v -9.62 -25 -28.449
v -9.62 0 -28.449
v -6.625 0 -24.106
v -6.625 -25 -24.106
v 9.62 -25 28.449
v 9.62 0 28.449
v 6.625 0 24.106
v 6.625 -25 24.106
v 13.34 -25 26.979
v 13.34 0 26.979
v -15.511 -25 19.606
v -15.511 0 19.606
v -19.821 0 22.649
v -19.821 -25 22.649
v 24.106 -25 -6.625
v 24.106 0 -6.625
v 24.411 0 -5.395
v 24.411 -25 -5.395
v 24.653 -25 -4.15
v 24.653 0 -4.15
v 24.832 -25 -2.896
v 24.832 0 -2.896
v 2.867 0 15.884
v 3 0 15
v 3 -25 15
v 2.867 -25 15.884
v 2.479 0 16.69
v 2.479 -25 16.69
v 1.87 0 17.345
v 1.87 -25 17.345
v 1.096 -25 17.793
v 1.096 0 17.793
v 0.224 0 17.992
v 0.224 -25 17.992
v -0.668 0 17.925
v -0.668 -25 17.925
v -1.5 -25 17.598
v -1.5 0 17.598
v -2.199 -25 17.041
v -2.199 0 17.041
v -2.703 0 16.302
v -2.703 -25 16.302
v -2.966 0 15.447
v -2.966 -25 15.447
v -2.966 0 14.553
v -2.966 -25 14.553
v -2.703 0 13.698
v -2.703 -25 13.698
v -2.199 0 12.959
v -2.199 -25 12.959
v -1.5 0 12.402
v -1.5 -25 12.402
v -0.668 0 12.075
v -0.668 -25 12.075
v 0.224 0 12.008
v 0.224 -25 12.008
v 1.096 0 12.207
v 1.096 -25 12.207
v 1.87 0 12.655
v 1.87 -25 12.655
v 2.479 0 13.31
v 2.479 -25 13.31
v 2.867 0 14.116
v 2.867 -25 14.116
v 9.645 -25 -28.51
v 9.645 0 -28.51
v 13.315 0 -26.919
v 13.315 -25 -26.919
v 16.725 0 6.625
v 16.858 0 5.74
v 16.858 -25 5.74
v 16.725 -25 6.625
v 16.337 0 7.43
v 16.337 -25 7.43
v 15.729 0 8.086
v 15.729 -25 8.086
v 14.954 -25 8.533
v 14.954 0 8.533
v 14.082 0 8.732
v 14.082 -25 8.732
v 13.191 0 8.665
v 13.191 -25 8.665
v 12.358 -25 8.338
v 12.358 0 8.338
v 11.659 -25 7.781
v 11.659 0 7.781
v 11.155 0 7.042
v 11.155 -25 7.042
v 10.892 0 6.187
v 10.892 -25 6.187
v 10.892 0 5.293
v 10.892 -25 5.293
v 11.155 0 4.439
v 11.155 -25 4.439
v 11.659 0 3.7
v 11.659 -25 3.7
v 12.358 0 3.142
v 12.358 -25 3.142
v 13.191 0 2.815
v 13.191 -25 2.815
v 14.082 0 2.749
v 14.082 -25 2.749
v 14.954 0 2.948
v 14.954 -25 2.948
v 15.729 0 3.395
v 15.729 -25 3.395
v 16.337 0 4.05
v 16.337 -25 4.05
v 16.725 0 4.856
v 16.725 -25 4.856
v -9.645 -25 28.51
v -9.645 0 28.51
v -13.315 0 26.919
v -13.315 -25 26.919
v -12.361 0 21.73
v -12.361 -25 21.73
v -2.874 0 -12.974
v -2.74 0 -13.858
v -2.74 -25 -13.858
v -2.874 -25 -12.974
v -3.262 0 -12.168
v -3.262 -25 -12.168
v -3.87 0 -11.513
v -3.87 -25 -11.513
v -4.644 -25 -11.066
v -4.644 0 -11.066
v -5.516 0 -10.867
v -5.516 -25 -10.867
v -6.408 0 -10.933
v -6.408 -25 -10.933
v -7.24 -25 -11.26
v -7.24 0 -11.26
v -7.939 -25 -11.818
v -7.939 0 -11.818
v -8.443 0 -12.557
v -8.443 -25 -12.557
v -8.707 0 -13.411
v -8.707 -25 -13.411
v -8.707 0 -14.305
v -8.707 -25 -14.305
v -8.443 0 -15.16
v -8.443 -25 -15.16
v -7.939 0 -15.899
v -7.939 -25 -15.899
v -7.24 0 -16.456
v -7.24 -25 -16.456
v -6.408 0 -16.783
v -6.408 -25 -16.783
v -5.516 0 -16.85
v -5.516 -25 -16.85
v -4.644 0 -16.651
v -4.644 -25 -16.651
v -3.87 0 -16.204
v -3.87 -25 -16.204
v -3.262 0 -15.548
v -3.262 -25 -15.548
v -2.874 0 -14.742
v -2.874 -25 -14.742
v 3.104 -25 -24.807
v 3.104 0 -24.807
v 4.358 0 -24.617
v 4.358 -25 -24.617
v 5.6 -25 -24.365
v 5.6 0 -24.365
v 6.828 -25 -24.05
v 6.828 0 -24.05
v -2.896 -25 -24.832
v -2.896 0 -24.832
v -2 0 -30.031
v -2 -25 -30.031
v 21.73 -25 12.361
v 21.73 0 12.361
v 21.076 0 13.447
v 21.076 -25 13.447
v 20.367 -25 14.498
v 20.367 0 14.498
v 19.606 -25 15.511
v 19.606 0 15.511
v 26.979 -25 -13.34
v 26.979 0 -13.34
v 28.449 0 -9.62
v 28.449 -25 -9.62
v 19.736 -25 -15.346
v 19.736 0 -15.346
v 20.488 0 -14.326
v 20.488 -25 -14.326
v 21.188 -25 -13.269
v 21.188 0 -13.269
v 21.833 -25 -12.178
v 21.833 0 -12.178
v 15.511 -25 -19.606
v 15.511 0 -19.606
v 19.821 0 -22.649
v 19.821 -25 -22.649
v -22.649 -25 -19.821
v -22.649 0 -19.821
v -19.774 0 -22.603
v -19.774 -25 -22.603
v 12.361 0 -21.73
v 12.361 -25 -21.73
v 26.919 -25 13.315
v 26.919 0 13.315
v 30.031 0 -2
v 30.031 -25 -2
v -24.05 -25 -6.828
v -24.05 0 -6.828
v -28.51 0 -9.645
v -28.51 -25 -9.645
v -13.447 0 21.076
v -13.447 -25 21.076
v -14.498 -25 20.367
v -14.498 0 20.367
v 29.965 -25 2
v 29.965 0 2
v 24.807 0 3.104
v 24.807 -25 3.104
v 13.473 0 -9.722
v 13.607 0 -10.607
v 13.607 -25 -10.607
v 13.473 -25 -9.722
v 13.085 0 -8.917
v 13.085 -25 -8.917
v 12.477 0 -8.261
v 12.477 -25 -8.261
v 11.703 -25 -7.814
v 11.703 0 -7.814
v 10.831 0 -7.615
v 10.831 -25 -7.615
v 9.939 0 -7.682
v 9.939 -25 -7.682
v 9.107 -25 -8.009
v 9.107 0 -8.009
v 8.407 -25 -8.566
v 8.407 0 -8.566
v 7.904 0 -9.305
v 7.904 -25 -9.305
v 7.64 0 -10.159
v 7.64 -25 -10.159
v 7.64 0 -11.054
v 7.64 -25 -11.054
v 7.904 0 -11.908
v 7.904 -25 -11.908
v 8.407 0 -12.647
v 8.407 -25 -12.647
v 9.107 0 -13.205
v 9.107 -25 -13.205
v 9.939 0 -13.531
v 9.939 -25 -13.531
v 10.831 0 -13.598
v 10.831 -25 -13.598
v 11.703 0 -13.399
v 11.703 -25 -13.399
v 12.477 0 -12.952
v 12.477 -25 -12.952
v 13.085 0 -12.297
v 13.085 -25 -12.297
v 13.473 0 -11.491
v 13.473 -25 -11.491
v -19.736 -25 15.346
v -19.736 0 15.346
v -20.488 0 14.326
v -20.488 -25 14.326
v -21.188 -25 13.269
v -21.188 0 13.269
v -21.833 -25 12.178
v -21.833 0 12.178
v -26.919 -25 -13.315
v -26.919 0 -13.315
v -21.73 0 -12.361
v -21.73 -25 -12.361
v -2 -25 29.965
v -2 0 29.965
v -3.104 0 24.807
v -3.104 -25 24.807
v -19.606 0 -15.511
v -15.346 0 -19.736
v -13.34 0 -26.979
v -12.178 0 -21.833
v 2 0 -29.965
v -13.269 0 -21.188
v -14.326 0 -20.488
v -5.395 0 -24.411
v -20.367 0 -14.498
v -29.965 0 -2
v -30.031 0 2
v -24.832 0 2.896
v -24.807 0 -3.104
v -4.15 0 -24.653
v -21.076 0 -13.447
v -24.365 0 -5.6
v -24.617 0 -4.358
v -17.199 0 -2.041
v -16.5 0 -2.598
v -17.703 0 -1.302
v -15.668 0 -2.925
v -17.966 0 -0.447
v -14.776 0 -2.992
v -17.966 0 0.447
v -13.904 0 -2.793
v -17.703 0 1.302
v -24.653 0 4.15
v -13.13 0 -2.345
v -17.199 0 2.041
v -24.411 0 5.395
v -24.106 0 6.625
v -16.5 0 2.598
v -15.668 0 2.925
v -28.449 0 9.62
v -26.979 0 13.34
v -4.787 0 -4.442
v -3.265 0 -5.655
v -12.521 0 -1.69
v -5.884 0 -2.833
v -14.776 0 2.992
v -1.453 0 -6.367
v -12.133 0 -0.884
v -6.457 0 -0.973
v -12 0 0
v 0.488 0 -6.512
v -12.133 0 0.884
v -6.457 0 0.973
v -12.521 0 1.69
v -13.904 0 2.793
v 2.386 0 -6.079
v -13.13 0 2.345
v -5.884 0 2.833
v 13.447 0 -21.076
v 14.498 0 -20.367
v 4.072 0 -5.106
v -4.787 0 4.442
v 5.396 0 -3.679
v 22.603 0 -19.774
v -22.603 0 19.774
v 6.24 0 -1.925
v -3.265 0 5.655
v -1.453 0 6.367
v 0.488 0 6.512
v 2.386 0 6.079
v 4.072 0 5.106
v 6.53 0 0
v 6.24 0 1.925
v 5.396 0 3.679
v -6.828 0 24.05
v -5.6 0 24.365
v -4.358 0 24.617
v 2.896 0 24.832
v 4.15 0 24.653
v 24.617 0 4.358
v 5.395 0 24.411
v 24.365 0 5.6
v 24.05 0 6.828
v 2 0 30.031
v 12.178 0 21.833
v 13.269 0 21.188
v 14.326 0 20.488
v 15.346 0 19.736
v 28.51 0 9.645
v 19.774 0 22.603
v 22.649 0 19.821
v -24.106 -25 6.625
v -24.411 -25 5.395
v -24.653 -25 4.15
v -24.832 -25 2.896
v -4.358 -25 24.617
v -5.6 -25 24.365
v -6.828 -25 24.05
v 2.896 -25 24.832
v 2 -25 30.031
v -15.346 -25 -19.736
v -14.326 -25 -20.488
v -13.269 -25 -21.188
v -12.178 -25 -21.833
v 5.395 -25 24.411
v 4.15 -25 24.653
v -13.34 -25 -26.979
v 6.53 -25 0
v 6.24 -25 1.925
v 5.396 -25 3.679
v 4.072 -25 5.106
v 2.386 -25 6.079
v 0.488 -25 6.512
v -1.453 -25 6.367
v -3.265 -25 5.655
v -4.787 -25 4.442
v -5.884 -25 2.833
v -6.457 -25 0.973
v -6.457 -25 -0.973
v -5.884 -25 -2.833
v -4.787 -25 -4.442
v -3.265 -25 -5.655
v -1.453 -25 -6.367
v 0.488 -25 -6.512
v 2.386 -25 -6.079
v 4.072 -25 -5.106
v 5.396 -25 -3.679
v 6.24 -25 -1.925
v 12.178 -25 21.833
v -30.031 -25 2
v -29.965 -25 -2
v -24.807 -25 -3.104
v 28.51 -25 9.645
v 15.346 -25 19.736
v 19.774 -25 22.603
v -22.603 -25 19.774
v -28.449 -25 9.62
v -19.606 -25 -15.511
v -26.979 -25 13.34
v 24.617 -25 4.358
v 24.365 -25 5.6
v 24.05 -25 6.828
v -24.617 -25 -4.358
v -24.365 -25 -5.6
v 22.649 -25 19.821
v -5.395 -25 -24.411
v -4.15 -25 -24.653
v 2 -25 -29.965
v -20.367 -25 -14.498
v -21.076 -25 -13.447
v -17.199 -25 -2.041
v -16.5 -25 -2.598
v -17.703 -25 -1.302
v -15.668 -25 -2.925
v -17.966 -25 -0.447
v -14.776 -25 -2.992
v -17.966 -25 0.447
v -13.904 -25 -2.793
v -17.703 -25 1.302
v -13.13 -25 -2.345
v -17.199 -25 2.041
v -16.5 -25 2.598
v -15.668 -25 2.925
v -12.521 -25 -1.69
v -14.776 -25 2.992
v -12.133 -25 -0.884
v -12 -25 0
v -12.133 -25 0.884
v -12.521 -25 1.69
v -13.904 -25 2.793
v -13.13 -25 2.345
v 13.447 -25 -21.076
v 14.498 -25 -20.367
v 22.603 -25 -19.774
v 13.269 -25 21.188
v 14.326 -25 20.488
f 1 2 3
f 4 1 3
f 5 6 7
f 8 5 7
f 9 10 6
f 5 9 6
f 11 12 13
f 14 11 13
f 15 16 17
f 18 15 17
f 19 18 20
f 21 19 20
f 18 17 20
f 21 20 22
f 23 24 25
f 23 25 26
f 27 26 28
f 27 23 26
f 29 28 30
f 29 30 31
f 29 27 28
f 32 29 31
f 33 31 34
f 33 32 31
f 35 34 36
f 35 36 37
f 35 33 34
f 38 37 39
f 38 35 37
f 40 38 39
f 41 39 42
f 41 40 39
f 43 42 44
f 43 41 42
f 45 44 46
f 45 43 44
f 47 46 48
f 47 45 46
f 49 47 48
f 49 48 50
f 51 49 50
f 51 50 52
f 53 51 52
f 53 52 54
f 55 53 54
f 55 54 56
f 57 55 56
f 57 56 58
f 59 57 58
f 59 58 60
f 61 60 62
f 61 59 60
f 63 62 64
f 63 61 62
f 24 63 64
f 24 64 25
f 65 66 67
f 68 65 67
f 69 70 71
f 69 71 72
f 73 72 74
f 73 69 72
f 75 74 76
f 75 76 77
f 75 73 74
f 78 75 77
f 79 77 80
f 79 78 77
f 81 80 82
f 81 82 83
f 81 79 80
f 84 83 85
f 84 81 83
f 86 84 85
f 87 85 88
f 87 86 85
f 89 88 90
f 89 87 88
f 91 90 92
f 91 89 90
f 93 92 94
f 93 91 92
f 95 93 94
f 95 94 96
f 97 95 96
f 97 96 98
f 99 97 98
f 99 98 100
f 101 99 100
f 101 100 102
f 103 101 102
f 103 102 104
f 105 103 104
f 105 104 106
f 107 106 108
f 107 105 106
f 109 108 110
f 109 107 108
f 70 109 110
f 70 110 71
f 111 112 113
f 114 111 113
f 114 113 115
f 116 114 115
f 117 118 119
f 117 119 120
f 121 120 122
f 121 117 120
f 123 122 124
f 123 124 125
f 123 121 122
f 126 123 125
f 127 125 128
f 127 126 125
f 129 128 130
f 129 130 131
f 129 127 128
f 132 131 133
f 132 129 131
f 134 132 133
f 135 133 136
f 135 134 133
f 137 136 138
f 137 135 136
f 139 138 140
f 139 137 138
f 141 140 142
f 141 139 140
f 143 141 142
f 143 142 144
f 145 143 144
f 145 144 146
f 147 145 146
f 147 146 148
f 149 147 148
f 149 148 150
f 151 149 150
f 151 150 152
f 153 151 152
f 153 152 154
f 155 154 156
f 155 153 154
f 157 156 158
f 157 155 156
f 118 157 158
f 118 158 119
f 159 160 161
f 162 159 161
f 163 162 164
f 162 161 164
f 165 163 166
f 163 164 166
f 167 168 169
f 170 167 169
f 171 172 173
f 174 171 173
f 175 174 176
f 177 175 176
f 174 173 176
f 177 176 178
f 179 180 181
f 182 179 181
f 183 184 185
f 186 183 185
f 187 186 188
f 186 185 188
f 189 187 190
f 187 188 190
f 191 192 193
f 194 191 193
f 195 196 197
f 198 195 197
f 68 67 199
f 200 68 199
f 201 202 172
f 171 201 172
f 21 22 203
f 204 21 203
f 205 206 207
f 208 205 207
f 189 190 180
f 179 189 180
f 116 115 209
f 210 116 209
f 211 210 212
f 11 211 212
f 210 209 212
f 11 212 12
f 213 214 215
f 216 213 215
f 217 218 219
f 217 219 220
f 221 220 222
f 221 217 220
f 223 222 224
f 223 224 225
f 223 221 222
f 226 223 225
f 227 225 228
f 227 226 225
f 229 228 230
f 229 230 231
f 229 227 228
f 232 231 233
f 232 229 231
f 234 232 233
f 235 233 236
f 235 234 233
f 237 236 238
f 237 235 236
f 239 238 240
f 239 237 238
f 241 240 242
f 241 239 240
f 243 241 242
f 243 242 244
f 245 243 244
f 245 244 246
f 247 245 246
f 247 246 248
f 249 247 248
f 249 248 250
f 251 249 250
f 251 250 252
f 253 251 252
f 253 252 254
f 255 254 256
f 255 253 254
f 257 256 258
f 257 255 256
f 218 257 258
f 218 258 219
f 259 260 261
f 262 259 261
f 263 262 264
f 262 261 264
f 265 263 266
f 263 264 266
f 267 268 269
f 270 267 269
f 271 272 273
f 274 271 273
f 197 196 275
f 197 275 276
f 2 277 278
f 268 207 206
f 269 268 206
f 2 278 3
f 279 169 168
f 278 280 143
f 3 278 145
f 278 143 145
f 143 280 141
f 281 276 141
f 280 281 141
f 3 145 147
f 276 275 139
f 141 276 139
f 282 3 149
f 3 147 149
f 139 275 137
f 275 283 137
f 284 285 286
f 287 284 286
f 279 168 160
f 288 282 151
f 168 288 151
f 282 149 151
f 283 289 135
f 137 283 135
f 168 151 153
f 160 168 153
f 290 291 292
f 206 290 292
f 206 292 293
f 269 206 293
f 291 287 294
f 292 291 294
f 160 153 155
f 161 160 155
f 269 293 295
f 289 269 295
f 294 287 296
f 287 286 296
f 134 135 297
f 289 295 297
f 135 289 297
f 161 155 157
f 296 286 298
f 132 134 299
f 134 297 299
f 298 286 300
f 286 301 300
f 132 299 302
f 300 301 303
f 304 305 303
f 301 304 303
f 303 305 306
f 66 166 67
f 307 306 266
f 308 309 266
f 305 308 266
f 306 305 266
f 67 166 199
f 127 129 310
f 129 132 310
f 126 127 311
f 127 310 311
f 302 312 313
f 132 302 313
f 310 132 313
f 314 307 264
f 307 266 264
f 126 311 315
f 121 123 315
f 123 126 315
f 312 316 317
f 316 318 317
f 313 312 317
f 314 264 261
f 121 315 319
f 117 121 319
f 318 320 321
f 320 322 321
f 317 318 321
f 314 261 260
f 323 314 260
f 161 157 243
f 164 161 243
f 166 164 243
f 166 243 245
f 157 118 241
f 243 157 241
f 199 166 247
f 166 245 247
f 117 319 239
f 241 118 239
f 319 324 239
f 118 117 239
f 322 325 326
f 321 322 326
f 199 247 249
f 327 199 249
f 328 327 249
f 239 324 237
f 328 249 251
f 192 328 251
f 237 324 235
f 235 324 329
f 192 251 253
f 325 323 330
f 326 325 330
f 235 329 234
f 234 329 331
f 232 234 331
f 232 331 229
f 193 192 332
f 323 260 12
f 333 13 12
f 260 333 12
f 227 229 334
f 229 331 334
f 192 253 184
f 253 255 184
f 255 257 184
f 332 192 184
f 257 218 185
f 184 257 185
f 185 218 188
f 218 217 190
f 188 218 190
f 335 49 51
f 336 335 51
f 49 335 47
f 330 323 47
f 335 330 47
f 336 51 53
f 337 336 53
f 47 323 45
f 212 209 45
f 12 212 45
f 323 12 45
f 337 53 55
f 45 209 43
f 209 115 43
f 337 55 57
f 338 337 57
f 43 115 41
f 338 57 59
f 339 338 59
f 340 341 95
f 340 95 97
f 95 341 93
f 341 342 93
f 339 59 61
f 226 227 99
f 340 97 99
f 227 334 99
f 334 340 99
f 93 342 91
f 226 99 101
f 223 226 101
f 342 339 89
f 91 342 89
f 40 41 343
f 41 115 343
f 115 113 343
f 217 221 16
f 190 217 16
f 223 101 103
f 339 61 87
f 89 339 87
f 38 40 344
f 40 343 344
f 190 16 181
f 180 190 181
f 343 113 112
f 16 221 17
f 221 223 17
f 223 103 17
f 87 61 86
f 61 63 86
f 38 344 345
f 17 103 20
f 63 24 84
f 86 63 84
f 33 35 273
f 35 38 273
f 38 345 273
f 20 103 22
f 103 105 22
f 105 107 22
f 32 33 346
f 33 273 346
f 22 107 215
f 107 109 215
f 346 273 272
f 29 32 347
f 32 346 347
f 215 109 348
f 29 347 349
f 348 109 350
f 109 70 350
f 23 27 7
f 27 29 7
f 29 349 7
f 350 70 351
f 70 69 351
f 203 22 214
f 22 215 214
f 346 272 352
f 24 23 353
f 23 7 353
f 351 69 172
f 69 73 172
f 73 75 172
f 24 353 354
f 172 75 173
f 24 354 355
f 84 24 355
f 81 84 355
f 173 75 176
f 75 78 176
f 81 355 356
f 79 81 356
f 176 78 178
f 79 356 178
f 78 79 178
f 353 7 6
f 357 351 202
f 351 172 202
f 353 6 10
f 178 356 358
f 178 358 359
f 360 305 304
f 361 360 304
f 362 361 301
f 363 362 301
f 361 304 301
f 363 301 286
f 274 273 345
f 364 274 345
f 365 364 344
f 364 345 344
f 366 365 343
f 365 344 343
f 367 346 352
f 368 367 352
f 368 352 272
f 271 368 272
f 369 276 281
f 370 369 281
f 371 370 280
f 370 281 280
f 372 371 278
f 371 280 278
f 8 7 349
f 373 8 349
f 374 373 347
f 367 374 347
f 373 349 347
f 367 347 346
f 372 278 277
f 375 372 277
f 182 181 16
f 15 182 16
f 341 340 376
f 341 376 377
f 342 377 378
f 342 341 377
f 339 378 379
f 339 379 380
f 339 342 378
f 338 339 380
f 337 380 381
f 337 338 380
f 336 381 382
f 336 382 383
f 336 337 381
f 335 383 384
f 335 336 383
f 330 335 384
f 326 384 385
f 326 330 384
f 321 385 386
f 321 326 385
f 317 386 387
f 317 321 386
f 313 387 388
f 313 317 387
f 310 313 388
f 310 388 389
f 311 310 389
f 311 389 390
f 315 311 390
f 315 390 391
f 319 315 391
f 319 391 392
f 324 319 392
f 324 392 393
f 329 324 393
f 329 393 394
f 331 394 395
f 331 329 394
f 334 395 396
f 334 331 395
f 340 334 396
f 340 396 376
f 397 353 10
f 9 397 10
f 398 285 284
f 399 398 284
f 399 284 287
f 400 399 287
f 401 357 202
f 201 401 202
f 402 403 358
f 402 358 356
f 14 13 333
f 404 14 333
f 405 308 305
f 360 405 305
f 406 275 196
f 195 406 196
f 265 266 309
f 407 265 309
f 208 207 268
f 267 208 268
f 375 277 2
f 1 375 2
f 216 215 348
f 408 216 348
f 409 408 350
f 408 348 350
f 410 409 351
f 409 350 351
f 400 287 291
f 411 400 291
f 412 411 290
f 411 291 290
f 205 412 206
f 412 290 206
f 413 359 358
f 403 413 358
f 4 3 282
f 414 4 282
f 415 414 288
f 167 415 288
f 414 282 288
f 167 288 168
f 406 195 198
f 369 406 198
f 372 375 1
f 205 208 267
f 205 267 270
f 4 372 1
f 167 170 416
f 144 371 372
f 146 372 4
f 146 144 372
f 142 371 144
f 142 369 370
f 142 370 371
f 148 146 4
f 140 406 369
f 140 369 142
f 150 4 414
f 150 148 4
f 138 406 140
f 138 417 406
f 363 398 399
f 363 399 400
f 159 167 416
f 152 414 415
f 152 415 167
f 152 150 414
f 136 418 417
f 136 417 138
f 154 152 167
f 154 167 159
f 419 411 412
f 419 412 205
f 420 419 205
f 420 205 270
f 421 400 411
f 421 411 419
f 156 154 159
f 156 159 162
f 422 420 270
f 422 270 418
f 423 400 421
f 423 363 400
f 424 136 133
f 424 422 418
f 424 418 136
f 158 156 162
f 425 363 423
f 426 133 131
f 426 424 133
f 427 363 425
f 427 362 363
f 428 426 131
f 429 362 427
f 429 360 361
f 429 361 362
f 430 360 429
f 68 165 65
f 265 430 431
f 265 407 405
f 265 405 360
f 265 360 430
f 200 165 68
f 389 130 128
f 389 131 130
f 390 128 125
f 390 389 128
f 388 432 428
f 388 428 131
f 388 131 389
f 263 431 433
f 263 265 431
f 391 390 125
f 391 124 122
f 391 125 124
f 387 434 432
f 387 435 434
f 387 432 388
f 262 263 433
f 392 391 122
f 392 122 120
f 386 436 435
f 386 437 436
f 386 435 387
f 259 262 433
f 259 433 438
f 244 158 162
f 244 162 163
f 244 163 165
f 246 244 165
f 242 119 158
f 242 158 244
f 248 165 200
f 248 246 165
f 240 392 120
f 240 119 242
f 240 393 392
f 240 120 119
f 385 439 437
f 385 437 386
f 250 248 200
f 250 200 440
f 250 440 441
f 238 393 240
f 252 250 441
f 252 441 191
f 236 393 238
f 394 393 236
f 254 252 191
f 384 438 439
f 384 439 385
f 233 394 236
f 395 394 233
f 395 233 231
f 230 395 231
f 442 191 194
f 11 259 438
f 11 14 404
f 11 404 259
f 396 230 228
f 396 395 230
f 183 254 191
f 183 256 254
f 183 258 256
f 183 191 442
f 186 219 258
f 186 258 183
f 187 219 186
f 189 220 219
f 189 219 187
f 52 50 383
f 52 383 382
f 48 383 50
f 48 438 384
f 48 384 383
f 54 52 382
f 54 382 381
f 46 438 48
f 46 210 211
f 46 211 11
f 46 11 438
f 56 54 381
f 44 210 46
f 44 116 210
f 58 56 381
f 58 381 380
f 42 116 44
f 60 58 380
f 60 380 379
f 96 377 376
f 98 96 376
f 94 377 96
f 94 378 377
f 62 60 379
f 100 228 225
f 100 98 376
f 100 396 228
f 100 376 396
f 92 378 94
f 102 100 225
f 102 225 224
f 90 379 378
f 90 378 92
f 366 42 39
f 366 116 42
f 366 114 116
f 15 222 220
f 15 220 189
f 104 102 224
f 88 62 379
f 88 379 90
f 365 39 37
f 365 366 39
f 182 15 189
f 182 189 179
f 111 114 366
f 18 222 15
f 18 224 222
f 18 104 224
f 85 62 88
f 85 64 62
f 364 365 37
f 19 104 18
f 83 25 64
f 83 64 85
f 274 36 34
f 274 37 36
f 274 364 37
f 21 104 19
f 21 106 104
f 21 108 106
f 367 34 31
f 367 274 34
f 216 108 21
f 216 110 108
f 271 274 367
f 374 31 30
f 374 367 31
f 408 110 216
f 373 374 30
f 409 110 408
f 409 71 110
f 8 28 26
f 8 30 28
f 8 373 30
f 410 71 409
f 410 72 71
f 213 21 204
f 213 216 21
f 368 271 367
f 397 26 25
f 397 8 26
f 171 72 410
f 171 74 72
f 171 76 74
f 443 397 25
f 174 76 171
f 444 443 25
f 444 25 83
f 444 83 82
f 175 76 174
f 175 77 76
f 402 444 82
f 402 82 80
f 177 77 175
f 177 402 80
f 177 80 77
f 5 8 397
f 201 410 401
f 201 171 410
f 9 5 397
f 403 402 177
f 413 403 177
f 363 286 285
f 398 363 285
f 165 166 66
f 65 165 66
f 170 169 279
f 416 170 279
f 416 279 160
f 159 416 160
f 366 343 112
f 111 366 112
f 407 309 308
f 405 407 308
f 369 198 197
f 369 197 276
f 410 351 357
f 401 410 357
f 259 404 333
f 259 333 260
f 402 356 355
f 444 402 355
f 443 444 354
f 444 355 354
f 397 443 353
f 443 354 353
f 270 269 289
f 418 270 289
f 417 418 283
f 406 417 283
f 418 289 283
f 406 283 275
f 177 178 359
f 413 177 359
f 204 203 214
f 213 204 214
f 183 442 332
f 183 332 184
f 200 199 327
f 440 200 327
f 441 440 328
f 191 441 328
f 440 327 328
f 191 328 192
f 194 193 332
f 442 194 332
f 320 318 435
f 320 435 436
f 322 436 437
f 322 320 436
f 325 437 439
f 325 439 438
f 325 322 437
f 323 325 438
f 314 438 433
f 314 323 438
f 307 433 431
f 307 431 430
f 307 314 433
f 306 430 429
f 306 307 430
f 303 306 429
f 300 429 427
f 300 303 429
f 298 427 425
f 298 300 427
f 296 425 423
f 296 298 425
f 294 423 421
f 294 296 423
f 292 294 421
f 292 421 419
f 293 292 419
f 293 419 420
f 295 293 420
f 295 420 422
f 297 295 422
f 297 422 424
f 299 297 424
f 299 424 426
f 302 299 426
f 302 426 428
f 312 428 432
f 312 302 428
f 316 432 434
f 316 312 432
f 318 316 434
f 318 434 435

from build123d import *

# Parameters (mm, degrees)
F0_R     = 3
F0_R_2   = 6.530293
F1_DEPTH = 25


with BuildPart() as f1:
    # F0 (on Front) → F1 (new body)
    with BuildSketch(Plane.XZ):
        with BuildLine():
            ThreePointArc((24.831743, -2.895608), (24.9579, -1.450246), (25, 0))
            ThreePointArc((25, 0), (24.95158, 1.555208), (24.806506, 3.104392))
            ThreePointArc((24.806506, 3.104392), (24.498901, 4.980347), (24.04964, 6.827504))
            ThreePointArc((24.04964, 6.827504), (23.056544, 9.664149), (21.730224, 12.361123))
            ThreePointArc((21.730224, 12.361123), (20.728137, 13.976564), (19.606198, 15.51119))
            ThreePointArc((19.606198, 15.51119), (17.603159, 17.751867), (15.345712, 19.735986))
            ThreePointArc((15.345712, 19.735986), (13.801702, 20.844976), (12.177889, 21.833438))
            ThreePointArc((12.177889, 21.833438), (9.469853, 23.137024), (6.624954, 24.106223))
            ThreePointArc((6.624954, 24.106223), (4.774083, 24.539929), (2.895608, 24.831743))
            ThreePointArc((2.895608, 24.831743), (-0.105152, 24.999779), (-3.104392, 24.806506))
            ThreePointArc((-3.104392, 24.806506), (-4.980347, 24.498901), (-6.827504, 24.04964))
            ThreePointArc((-6.827504, 24.04964), (-9.664149, 23.056544), (-12.361123, 21.730224))
            ThreePointArc((-12.361123, 21.730224), (-13.976564, 20.728137), (-15.51119, 19.606198))
            ThreePointArc((-15.51119, 19.606198), (-17.751867, 17.603159), (-19.735986, 15.345712))
            ThreePointArc((-19.735986, 15.345712), (-20.844976, 13.801702), (-21.833438, 12.177889))
            ThreePointArc((-21.833438, 12.177889), (-23.137024, 9.469853), (-24.106223, 6.624954))
            ThreePointArc((-24.106223, 6.624954), (-24.539929, 4.774083), (-24.831743, 2.895608))
            ThreePointArc((-24.831743, 2.895608), (-24.999779, -0.105152), (-24.806506, -3.104392))
            ThreePointArc((-24.806506, -3.104392), (-24.498901, -4.980347), (-24.04964, -6.827504))
            ThreePointArc((-24.04964, -6.827504), (-23.056544, -9.664149), (-21.730224, -12.361123))
            ThreePointArc((-21.730224, -12.361123), (-20.728137, -13.976564), (-19.606198, -15.51119))
            ThreePointArc((-19.606198, -15.51119), (-17.603159, -17.751867), (-15.345712, -19.735986))
            ThreePointArc((-15.345712, -19.735986), (-13.801702, -20.844976), (-12.177889, -21.833438))
            ThreePointArc((-12.177889, -21.833438), (-9.469853, -23.137024), (-6.624954, -24.106223))
            ThreePointArc((-6.624954, -24.106223), (-4.774083, -24.539929), (-2.895608, -24.831743))
            ThreePointArc((-2.895608, -24.831743), (0.105152, -24.999779), (3.104392, -24.806506))
            ThreePointArc((3.104392, -24.806506), (4.980347, -24.498901), (6.827504, -24.04964))
            ThreePointArc((6.827504, -24.04964), (9.664149, -23.056544), (12.361123, -21.730224))
            ThreePointArc((12.361123, -21.730224), (13.976564, -20.728137), (15.51119, -19.606198))
            ThreePointArc((15.51119, -19.606198), (17.751867, -17.603159), (19.735986, -15.345712))
            ThreePointArc((19.735986, -15.345712), (20.844976, -13.801702), (21.833438, -12.177889))
            ThreePointArc((21.833438, -12.177889), (23.137024, -9.469853), (24.106223, -6.624954))
            ThreePointArc((24.106223, -6.624954), (24.539929, -4.774083), (24.831743, -2.895608))
        make_face()
        with Locations((-5.740251, -13.858193)):
            Circle(F0_R, mode=Mode.SUBTRACT)
        with Locations((10.606602, -10.606602)):
            Circle(F0_R, mode=Mode.SUBTRACT)
        with Locations((-15, 0)):
            Circle(F0_R, mode=Mode.SUBTRACT)
        Circle(F0_R_2, mode=Mode.SUBTRACT)
        with Locations((13.858193, 5.740251)):
            Circle(F0_R, mode=Mode.SUBTRACT)
        with Locations((0, 15)):
            Circle(F0_R, mode=Mode.SUBTRACT)
        with BuildLine():
            ThreePointArc((24.806506, 3.104392), (24.95158, 1.555208), (25, 0))
            ThreePointArc((25, 0), (24.9579, -1.450246), (24.831743, -2.895608))
            Line((24.831743, -2.895608), (30.030659, -1.999731))
            Line((30.030659, -1.999731), (29.965095, 1.999731))
            Line((29.965095, 1.999731), (24.806506, 3.104392))
        make_face()
        with BuildLine():
            ThreePointArc((21.730224, 12.361123), (23.056544, 9.664149), (24.04964, 6.827504))
            Line((24.04964, 6.827504), (28.509975, 9.644725))
            Line((28.509975, 9.644725), (26.918874, 13.314656))
            Line((26.918874, 13.314656), (21.730224, 12.361123))
        make_face()
        with BuildLine():
            Line((28.449402, -9.619635), (24.106223, -6.624954))
            ThreePointArc((24.106223, -6.624954), (23.137024, -9.469853), (21.833438, -12.177889))
            Line((21.833438, -12.177889), (26.979447, -13.339746))
            Line((26.979447, -13.339746), (28.449402, -9.619635))
        make_face()
        with BuildLine():
            ThreePointArc((15.345712, 19.735986), (17.603159, 17.751867), (19.606198, 15.51119))
            Line((19.606198, 15.51119), (22.648906, 19.820859))
            Line((22.648906, 19.820859), (19.774499, 22.602546))
            Line((19.774499, 22.602546), (15.345712, 19.735986))
        make_face()
        with BuildLine():
            Line((22.602546, -19.774499), (19.735986, -15.345712))
            ThreePointArc((19.735986, -15.345712), (17.751867, -17.603159), (15.51119, -19.606198))
            Line((15.51119, -19.606198), (19.820859, -22.648906))
            Line((19.820859, -22.648906), (22.602546, -19.774499))
        make_face()
        with BuildLine():
            ThreePointArc((6.624954, 24.106223), (9.469853, 23.137024), (12.177889, 21.833438))
            Line((12.177889, 21.833438), (13.339746, 26.979447))
            Line((13.339746, 26.979447), (9.619635, 28.449402))
            Line((9.619635, 28.449402), (6.624954, 24.106223))
        make_face()
        with BuildLine():
            Line((13.314656, -26.918874), (12.361123, -21.730224))
            ThreePointArc((12.361123, -21.730224), (9.664149, -23.056544), (6.827504, -24.04964))
            Line((6.827504, -24.04964), (9.644725, -28.509975))
            Line((9.644725, -28.509975), (13.314656, -26.918874))
        make_face()
        with BuildLine():
            ThreePointArc((-3.104392, 24.806506), (-0.105152, 24.999779), (2.895608, 24.831743))
            Line((2.895608, 24.831743), (1.999731, 30.030659))
            Line((1.999731, 30.030659), (-1.999731, 29.965095))
            Line((-1.999731, 29.965095), (-3.104392, 24.806506))
        make_face()
        with BuildLine():
            Line((1.999731, -29.965095), (3.104392, -24.806506))
            ThreePointArc((3.104392, -24.806506), (0.105152, -24.999779), (-2.895608, -24.831743))
            Line((-2.895608, -24.831743), (-1.999731, -30.030659))
            Line((-1.999731, -30.030659), (1.999731, -29.965095))
        make_face()
        with BuildLine():
            ThreePointArc((-12.361123, 21.730224), (-9.664149, 23.056544), (-6.827504, 24.04964))
            Line((-6.827504, 24.04964), (-9.644725, 28.509975))
            Line((-9.644725, 28.509975), (-13.314656, 26.918874))
            Line((-13.314656, 26.918874), (-12.361123, 21.730224))
        make_face()
        with BuildLine():
            Line((-9.619635, -28.449402), (-6.624954, -24.106223))
            ThreePointArc((-6.624954, -24.106223), (-9.469853, -23.137024), (-12.177889, -21.833438))
            Line((-12.177889, -21.833438), (-13.339746, -26.979447))
            Line((-13.339746, -26.979447), (-9.619635, -28.449402))
        make_face()
        with BuildLine():
            ThreePointArc((-19.735986, 15.345712), (-17.751867, 17.603159), (-15.51119, 19.606198))
            Line((-15.51119, 19.606198), (-19.820859, 22.648906))
            Line((-19.820859, 22.648906), (-22.602546, 19.774499))
            Line((-22.602546, 19.774499), (-19.735986, 15.345712))
        make_face()
        with BuildLine():
            Line((-19.774499, -22.602546), (-15.345712, -19.735986))
            ThreePointArc((-15.345712, -19.735986), (-17.603159, -17.751867), (-19.606198, -15.51119))
            Line((-19.606198, -15.51119), (-22.648906, -19.820859))
            Line((-22.648906, -19.820859), (-19.774499, -22.602546))
        make_face()
        with BuildLine():
            ThreePointArc((-24.106223, 6.624954), (-23.137024, 9.469853), (-21.833438, 12.177889))
            Line((-21.833438, 12.177889), (-26.979447, 13.339746))
            Line((-26.979447, 13.339746), (-28.449402, 9.619635))
            Line((-28.449402, 9.619635), (-24.106223, 6.624954))
        make_face()
        with BuildLine():
            Line((-26.918874, -13.314656), (-21.730224, -12.361123))
            ThreePointArc((-21.730224, -12.361123), (-23.056544, -9.664149), (-24.04964, -6.827504))
            Line((-24.04964, -6.827504), (-28.509975, -9.644725))
            Line((-28.509975, -9.644725), (-26.918874, -13.314656))
        make_face()
        with BuildLine():
            ThreePointArc((-24.806506, -3.104392), (-24.999779, -0.105152), (-24.831743, 2.895608))
            Line((-24.831743, 2.895608), (-30.030659, 1.999731))
            Line((-30.030659, 1.999731), (-29.965095, -1.999731))
            Line((-29.965095, -1.999731), (-24.806506, -3.104392))
        make_face()
    extrude(amount=F1_DEPTH)


solid = f1.part
